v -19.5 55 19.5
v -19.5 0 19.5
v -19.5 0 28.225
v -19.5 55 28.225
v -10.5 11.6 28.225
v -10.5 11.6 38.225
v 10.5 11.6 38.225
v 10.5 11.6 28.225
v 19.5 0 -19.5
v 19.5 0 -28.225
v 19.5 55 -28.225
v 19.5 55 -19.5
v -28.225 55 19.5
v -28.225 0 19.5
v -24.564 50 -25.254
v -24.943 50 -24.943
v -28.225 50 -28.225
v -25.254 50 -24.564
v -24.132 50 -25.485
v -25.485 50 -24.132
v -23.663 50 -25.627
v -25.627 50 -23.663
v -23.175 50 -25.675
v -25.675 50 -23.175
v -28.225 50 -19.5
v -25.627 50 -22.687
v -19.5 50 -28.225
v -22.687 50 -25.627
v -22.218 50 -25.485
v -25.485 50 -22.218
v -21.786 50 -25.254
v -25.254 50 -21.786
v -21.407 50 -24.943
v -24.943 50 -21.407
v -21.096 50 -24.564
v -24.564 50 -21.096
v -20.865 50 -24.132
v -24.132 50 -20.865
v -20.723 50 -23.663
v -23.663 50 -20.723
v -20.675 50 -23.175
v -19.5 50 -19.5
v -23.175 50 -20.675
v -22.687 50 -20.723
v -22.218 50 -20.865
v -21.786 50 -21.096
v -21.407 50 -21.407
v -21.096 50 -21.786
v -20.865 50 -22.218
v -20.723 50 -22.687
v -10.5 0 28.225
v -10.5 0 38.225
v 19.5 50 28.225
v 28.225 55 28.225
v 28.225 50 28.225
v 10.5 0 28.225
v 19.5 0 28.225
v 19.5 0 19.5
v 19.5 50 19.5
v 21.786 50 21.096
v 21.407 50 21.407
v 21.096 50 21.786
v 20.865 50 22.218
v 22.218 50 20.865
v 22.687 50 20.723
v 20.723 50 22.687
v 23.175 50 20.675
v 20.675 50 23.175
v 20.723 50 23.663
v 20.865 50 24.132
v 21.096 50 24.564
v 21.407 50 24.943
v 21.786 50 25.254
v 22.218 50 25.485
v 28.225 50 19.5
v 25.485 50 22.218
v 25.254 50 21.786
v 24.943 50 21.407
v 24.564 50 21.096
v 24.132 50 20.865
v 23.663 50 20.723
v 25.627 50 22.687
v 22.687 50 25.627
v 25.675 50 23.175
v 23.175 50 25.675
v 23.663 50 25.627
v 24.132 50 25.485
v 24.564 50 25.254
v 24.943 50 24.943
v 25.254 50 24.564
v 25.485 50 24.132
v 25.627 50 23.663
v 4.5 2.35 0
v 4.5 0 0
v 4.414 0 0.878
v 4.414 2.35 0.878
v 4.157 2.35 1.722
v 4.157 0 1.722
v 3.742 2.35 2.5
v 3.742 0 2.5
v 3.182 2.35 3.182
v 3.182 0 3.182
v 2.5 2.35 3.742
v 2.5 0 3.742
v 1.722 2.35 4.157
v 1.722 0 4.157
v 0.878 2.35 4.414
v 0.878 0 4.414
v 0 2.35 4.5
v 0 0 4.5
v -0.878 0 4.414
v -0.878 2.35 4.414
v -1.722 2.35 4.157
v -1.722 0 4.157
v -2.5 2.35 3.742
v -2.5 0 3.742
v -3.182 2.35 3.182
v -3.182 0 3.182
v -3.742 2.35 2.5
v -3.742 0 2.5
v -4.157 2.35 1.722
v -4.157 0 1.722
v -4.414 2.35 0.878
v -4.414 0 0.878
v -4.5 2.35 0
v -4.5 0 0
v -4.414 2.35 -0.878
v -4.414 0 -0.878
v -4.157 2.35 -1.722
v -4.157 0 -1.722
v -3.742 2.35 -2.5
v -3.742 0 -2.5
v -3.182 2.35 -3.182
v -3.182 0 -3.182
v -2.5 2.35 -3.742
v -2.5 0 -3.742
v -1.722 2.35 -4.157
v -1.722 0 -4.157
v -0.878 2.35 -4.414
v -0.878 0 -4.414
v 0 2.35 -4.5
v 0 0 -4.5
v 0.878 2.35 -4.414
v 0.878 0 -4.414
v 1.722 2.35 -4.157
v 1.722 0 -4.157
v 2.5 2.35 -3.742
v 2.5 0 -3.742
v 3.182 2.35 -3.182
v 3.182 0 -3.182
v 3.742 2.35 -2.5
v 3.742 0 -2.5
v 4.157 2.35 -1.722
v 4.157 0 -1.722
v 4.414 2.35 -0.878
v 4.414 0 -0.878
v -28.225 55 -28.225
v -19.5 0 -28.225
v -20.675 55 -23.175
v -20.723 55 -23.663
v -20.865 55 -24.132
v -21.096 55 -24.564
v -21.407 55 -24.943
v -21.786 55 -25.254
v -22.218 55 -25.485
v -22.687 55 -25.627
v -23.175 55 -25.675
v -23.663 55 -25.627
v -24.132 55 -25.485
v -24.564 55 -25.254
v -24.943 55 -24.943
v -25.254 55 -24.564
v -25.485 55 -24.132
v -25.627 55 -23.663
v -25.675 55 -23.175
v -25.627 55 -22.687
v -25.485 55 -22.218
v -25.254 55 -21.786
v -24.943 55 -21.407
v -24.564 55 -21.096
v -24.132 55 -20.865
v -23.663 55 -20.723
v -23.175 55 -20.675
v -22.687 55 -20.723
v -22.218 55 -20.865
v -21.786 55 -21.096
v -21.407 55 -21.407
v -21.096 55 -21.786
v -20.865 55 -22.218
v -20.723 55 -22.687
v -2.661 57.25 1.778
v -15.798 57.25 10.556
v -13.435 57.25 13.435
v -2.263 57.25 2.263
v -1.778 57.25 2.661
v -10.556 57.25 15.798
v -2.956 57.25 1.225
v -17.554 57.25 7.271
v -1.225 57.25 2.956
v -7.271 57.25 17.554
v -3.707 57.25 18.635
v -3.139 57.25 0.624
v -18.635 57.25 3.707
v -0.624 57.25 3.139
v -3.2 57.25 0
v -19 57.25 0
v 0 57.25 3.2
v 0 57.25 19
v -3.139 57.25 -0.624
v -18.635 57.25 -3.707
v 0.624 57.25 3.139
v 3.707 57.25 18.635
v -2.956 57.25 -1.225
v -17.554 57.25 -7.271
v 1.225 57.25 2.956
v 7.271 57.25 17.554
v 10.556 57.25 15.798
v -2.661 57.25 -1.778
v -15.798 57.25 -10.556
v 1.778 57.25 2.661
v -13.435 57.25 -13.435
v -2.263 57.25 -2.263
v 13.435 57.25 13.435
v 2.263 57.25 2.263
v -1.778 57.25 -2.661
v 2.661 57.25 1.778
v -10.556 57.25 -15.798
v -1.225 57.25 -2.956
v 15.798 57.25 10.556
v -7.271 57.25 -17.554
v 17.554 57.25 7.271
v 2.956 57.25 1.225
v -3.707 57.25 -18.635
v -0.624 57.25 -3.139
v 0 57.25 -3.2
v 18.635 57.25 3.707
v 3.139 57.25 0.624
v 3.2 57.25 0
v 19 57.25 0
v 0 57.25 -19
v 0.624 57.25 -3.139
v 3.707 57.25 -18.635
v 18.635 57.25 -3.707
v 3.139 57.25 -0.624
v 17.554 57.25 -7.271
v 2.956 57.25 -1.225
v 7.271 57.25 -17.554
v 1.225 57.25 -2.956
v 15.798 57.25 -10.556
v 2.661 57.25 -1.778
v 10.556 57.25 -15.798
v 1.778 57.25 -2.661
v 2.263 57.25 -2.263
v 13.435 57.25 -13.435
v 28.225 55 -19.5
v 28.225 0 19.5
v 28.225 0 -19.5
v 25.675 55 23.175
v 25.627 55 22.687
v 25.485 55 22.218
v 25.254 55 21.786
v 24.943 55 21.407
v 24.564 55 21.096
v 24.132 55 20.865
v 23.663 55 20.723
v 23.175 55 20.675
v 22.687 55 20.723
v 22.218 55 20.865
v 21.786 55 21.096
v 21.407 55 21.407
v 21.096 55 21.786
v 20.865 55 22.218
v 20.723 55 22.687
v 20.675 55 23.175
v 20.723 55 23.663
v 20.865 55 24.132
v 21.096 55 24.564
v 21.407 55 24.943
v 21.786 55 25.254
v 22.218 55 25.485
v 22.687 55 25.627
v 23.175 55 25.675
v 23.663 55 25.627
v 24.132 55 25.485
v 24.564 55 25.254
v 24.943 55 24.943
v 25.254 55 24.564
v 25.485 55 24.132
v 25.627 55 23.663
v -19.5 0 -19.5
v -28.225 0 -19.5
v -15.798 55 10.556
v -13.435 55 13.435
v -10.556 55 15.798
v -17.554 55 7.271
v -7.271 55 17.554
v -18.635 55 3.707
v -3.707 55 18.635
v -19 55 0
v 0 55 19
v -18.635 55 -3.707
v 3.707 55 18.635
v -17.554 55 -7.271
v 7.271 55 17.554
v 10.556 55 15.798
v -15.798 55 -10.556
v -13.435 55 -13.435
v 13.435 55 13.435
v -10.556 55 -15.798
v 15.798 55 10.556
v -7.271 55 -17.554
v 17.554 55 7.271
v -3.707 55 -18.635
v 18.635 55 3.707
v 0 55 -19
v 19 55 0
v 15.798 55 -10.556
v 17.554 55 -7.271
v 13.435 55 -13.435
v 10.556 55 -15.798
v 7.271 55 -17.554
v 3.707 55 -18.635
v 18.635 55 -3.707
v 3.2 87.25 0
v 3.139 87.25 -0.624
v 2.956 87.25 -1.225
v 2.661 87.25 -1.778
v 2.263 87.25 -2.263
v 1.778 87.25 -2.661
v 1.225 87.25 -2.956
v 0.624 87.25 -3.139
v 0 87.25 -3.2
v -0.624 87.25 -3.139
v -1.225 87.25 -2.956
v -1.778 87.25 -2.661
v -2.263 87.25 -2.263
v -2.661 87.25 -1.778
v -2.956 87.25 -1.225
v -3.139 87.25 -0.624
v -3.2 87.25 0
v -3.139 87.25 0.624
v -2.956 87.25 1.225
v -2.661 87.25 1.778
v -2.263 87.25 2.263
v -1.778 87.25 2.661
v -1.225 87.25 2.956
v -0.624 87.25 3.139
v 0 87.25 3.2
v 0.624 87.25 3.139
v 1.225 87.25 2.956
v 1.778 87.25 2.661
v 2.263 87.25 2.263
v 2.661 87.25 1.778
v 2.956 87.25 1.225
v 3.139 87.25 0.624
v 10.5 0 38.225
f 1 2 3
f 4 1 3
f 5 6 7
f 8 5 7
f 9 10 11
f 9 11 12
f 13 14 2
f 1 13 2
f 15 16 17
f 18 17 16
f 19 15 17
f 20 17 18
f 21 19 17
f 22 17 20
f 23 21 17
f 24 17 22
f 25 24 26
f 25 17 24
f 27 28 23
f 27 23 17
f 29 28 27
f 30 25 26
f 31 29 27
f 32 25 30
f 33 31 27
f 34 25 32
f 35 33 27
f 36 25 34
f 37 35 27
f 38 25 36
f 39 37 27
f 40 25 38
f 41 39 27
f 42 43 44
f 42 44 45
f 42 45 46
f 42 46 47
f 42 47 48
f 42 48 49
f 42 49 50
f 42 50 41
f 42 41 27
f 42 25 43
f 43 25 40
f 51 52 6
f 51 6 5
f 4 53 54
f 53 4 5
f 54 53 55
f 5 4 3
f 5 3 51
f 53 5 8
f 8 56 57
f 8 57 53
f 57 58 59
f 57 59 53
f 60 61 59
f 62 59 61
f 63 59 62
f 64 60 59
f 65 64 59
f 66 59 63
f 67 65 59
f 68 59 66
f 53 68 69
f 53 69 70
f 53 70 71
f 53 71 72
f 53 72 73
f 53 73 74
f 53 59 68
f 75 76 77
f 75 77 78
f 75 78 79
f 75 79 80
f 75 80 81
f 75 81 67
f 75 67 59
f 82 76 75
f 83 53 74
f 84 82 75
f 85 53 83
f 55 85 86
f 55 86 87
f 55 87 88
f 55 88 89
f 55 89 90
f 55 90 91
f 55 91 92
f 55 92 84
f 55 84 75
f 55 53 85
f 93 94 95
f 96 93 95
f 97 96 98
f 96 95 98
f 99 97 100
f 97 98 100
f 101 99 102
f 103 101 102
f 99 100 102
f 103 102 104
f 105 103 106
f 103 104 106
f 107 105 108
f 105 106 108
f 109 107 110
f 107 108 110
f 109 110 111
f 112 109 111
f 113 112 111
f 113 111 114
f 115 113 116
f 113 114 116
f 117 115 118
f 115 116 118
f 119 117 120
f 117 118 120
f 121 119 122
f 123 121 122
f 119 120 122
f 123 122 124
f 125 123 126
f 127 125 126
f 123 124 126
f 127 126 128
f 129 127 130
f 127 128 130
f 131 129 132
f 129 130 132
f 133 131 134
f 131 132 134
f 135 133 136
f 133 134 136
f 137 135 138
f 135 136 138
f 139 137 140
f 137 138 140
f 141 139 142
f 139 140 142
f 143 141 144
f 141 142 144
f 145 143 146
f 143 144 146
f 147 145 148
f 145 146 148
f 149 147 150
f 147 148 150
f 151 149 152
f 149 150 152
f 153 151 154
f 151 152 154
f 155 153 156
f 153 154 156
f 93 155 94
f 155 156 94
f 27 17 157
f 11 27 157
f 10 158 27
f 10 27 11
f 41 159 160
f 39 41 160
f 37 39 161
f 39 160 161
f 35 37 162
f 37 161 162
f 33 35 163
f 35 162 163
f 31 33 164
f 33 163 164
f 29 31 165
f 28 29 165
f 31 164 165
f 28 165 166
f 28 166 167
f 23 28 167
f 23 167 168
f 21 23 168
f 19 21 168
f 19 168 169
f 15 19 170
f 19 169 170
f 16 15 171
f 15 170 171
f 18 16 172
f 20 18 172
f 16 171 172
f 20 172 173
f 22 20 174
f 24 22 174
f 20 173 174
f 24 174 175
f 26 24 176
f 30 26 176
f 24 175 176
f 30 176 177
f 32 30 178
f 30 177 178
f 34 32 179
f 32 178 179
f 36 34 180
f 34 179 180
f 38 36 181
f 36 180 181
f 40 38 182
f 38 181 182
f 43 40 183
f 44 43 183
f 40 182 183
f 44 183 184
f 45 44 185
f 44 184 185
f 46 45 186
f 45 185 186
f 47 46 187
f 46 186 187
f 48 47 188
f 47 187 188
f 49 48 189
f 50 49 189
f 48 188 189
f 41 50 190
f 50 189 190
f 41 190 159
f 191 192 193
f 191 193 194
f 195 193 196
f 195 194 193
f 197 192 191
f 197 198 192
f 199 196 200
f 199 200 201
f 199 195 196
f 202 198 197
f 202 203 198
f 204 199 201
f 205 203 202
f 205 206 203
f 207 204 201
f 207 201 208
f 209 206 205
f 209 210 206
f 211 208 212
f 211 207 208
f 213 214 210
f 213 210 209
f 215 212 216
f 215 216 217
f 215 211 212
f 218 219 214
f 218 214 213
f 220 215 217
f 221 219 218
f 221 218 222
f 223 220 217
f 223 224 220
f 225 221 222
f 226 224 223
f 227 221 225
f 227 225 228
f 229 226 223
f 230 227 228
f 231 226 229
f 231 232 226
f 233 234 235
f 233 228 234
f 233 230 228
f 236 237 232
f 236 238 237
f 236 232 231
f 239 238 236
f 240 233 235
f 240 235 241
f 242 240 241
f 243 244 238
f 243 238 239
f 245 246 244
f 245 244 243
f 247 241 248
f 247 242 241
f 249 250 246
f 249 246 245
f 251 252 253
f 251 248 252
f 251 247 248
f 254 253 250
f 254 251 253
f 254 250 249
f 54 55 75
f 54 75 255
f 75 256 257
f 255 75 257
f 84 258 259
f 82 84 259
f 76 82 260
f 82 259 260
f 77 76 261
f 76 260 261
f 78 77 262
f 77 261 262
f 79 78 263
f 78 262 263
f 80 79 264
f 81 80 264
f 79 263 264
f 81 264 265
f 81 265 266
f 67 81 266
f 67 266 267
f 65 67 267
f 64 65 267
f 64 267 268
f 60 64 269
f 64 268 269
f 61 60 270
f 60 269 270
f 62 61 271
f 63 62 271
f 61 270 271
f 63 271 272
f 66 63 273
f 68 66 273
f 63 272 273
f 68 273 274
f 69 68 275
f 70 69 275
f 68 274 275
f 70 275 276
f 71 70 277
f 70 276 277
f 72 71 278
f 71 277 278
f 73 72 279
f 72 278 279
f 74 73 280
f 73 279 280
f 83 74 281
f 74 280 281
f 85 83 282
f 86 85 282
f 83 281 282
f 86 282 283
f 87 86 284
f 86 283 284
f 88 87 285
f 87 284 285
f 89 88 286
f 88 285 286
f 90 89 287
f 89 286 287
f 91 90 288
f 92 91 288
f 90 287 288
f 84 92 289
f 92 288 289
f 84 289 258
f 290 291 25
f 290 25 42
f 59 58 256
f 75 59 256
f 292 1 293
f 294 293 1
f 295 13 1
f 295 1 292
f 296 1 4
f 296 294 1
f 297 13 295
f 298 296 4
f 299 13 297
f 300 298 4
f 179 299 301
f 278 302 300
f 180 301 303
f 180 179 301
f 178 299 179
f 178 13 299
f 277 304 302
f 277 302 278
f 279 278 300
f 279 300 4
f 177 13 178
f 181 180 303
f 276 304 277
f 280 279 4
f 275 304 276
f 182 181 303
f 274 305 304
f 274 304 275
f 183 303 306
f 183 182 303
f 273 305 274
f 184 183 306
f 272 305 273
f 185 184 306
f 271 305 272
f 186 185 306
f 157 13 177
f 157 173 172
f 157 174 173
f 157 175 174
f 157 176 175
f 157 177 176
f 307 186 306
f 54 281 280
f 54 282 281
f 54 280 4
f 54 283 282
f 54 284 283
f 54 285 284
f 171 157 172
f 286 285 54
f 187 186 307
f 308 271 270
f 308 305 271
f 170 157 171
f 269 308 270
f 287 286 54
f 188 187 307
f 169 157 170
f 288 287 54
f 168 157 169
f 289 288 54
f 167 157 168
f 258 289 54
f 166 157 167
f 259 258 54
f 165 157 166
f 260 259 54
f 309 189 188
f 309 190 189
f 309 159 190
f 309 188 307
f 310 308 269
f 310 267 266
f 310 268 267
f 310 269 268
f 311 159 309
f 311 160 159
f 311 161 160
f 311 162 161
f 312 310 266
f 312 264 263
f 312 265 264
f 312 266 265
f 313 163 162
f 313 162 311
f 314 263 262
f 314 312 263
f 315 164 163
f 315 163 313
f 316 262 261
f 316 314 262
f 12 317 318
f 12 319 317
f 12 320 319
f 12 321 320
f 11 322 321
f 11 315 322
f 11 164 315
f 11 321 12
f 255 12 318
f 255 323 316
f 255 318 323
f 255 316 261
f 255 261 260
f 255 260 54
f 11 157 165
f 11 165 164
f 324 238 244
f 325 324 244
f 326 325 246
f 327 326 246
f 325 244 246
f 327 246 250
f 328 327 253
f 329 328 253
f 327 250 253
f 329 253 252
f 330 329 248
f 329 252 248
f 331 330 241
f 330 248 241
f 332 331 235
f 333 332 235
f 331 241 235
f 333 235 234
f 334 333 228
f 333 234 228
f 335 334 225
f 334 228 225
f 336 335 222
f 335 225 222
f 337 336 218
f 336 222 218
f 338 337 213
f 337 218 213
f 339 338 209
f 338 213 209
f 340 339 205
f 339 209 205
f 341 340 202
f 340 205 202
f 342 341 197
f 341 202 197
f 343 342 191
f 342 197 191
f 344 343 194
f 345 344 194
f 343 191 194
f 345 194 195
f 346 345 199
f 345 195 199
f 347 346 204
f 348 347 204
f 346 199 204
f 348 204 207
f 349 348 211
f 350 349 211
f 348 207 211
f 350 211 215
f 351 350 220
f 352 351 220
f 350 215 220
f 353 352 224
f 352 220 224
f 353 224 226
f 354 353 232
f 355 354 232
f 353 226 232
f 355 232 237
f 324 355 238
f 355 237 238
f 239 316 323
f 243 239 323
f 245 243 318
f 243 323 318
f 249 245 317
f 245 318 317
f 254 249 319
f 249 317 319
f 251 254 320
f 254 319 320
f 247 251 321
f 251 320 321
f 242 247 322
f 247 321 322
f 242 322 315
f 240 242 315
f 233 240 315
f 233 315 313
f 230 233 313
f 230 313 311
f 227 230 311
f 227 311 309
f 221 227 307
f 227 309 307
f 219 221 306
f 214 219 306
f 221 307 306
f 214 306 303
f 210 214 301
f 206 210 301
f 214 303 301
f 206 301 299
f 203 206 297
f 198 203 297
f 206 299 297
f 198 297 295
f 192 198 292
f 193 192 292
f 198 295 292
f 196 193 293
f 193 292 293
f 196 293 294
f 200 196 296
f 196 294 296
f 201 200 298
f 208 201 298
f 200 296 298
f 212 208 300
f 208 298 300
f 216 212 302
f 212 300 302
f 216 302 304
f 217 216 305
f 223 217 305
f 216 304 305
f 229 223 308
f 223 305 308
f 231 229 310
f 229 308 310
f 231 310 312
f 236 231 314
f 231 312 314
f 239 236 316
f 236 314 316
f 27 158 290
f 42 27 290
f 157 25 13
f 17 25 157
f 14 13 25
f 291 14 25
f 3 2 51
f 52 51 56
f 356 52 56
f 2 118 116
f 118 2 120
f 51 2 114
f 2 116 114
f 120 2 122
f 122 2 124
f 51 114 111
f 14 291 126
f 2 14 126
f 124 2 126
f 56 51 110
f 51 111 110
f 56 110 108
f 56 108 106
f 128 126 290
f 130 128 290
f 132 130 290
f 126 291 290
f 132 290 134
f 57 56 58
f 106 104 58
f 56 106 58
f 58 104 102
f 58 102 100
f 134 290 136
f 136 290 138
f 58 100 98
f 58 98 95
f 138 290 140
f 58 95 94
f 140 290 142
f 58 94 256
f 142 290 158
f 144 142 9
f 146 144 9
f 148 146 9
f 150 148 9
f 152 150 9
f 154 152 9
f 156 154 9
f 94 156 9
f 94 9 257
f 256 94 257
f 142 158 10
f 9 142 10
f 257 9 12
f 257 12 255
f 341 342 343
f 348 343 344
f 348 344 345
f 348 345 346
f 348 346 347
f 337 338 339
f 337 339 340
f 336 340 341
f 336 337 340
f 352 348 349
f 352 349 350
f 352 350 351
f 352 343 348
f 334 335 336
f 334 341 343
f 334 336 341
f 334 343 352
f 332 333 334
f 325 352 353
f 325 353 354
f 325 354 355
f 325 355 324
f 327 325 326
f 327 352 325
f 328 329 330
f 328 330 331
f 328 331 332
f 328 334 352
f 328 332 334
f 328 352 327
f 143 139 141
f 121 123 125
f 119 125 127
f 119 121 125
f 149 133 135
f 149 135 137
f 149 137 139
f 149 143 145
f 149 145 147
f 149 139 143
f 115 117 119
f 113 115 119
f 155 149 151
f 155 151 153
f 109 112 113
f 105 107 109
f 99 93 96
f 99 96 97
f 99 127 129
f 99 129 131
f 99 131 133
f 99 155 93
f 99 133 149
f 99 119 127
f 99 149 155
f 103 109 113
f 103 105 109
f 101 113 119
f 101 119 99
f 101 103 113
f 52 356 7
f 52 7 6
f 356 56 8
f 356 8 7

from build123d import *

# Parameters (mm, degrees)
SKETCH1_W           = 56.45
SKETCH1_H           = 56.45
BOSS_EXTRUDE1_DEPTH = 55
SKETCH2_R           = 19
BOSS_EXTRUDE2_DEPTH = 2.25
SKETCH3_R           = 3.2
BOSS_EXTRUDE3_DEPTH = 30
SKETCH4_W           = 8.725
SKETCH4_H           = 8.725
CUT_EXTRUDE1_DEPTH  = 55
SKETCH4_3_W         = 8.725
SKETCH4_3_H         = 8.725
CUT_EXTRUDE2_DEPTH  = 50
BOSS_EXTRUDE4_DEPTH = 11.6
SKETCH6_R           = 2.5
CUT_EXTRUDE3_DEPTH  = 5
SKETCH7_R           = 4.5
CUT_EXTRUDE4_DEPTH  = 2.35


with BuildPart() as part:
    # Sketch1 → Boss-Extrude1 (new body)
    with BuildSketch(Plane(origin=(0, 0, 0), x_dir=(1, 0, 0), z_dir=(0, 1, 0))):
        Rectangle(SKETCH1_W, SKETCH1_H)
    extrude(amount=BOSS_EXTRUDE1_DEPTH)

    # Sketch2 → Boss-Extrude2 (add)
    with BuildSketch(Plane(origin=(0, 55, 0), x_dir=(1, 0, 0), z_dir=(0, 1, 0))):
        Circle(SKETCH2_R)
    extrude(amount=BOSS_EXTRUDE2_DEPTH)

    # Sketch3 → Boss-Extrude3 (add)
    with BuildSketch(Plane(origin=(0, 57.25, 0), x_dir=(1, 0, 0), z_dir=(0, 1, 0))):
        Circle(SKETCH3_R)
    extrude(amount=BOSS_EXTRUDE3_DEPTH)

    # Sketch4 → Cut-Extrude1 (cut)
    with BuildSketch(Plane.XZ):
        with Locations((23.8625, -23.8625)):
            Rectangle(SKETCH4_W, SKETCH4_H)
        with Locations((-23.8625, 23.8625)):
            Rectangle(SKETCH4_W, SKETCH4_H)
    extrude(amount=-CUT_EXTRUDE1_DEPTH, mode=Mode.SUBTRACT)

    # Sketch4<3> → Cut-Extrude2 (cut)
    with BuildSketch(Plane.XZ):
        with Locations((23.8625, 23.8625)):
            Rectangle(SKETCH4_3_W, SKETCH4_3_H)
        with Locations((-23.8625, -23.8625)):
            Rectangle(SKETCH4_3_W, SKETCH4_3_H)
    extrude(amount=-CUT_EXTRUDE2_DEPTH, mode=Mode.SUBTRACT)

    # Sketch5 → Boss-Extrude4 (add)
    with BuildSketch(Plane.XZ):
        Polygon((0, 28.225), (10.5, 28.225), (10.5, 38.225), (-10.5, 38.225), (-10.5, 28.225), align=None)
    extrude(amount=-BOSS_EXTRUDE4_DEPTH)

    # Sketch6 → Cut-Extrude3 (cut)
    with BuildSketch(Plane(origin=(0, 55, 0), x_dir=(1, 0, 0), z_dir=(0, 1, 0))):
        with Locations((-23.175, 23.175)):
            Circle(SKETCH6_R)
        with Locations((23.175, -23.175)):
            Circle(SKETCH6_R)
    extrude(amount=-CUT_EXTRUDE3_DEPTH, mode=Mode.SUBTRACT)

    # Sketch7 → Cut-Extrude4 (cut)
    with BuildSketch(Plane.XZ):
        Circle(SKETCH7_R)
    extrude(amount=-CUT_EXTRUDE4_DEPTH, mode=Mode.SUBTRACT)


solid = part.part
